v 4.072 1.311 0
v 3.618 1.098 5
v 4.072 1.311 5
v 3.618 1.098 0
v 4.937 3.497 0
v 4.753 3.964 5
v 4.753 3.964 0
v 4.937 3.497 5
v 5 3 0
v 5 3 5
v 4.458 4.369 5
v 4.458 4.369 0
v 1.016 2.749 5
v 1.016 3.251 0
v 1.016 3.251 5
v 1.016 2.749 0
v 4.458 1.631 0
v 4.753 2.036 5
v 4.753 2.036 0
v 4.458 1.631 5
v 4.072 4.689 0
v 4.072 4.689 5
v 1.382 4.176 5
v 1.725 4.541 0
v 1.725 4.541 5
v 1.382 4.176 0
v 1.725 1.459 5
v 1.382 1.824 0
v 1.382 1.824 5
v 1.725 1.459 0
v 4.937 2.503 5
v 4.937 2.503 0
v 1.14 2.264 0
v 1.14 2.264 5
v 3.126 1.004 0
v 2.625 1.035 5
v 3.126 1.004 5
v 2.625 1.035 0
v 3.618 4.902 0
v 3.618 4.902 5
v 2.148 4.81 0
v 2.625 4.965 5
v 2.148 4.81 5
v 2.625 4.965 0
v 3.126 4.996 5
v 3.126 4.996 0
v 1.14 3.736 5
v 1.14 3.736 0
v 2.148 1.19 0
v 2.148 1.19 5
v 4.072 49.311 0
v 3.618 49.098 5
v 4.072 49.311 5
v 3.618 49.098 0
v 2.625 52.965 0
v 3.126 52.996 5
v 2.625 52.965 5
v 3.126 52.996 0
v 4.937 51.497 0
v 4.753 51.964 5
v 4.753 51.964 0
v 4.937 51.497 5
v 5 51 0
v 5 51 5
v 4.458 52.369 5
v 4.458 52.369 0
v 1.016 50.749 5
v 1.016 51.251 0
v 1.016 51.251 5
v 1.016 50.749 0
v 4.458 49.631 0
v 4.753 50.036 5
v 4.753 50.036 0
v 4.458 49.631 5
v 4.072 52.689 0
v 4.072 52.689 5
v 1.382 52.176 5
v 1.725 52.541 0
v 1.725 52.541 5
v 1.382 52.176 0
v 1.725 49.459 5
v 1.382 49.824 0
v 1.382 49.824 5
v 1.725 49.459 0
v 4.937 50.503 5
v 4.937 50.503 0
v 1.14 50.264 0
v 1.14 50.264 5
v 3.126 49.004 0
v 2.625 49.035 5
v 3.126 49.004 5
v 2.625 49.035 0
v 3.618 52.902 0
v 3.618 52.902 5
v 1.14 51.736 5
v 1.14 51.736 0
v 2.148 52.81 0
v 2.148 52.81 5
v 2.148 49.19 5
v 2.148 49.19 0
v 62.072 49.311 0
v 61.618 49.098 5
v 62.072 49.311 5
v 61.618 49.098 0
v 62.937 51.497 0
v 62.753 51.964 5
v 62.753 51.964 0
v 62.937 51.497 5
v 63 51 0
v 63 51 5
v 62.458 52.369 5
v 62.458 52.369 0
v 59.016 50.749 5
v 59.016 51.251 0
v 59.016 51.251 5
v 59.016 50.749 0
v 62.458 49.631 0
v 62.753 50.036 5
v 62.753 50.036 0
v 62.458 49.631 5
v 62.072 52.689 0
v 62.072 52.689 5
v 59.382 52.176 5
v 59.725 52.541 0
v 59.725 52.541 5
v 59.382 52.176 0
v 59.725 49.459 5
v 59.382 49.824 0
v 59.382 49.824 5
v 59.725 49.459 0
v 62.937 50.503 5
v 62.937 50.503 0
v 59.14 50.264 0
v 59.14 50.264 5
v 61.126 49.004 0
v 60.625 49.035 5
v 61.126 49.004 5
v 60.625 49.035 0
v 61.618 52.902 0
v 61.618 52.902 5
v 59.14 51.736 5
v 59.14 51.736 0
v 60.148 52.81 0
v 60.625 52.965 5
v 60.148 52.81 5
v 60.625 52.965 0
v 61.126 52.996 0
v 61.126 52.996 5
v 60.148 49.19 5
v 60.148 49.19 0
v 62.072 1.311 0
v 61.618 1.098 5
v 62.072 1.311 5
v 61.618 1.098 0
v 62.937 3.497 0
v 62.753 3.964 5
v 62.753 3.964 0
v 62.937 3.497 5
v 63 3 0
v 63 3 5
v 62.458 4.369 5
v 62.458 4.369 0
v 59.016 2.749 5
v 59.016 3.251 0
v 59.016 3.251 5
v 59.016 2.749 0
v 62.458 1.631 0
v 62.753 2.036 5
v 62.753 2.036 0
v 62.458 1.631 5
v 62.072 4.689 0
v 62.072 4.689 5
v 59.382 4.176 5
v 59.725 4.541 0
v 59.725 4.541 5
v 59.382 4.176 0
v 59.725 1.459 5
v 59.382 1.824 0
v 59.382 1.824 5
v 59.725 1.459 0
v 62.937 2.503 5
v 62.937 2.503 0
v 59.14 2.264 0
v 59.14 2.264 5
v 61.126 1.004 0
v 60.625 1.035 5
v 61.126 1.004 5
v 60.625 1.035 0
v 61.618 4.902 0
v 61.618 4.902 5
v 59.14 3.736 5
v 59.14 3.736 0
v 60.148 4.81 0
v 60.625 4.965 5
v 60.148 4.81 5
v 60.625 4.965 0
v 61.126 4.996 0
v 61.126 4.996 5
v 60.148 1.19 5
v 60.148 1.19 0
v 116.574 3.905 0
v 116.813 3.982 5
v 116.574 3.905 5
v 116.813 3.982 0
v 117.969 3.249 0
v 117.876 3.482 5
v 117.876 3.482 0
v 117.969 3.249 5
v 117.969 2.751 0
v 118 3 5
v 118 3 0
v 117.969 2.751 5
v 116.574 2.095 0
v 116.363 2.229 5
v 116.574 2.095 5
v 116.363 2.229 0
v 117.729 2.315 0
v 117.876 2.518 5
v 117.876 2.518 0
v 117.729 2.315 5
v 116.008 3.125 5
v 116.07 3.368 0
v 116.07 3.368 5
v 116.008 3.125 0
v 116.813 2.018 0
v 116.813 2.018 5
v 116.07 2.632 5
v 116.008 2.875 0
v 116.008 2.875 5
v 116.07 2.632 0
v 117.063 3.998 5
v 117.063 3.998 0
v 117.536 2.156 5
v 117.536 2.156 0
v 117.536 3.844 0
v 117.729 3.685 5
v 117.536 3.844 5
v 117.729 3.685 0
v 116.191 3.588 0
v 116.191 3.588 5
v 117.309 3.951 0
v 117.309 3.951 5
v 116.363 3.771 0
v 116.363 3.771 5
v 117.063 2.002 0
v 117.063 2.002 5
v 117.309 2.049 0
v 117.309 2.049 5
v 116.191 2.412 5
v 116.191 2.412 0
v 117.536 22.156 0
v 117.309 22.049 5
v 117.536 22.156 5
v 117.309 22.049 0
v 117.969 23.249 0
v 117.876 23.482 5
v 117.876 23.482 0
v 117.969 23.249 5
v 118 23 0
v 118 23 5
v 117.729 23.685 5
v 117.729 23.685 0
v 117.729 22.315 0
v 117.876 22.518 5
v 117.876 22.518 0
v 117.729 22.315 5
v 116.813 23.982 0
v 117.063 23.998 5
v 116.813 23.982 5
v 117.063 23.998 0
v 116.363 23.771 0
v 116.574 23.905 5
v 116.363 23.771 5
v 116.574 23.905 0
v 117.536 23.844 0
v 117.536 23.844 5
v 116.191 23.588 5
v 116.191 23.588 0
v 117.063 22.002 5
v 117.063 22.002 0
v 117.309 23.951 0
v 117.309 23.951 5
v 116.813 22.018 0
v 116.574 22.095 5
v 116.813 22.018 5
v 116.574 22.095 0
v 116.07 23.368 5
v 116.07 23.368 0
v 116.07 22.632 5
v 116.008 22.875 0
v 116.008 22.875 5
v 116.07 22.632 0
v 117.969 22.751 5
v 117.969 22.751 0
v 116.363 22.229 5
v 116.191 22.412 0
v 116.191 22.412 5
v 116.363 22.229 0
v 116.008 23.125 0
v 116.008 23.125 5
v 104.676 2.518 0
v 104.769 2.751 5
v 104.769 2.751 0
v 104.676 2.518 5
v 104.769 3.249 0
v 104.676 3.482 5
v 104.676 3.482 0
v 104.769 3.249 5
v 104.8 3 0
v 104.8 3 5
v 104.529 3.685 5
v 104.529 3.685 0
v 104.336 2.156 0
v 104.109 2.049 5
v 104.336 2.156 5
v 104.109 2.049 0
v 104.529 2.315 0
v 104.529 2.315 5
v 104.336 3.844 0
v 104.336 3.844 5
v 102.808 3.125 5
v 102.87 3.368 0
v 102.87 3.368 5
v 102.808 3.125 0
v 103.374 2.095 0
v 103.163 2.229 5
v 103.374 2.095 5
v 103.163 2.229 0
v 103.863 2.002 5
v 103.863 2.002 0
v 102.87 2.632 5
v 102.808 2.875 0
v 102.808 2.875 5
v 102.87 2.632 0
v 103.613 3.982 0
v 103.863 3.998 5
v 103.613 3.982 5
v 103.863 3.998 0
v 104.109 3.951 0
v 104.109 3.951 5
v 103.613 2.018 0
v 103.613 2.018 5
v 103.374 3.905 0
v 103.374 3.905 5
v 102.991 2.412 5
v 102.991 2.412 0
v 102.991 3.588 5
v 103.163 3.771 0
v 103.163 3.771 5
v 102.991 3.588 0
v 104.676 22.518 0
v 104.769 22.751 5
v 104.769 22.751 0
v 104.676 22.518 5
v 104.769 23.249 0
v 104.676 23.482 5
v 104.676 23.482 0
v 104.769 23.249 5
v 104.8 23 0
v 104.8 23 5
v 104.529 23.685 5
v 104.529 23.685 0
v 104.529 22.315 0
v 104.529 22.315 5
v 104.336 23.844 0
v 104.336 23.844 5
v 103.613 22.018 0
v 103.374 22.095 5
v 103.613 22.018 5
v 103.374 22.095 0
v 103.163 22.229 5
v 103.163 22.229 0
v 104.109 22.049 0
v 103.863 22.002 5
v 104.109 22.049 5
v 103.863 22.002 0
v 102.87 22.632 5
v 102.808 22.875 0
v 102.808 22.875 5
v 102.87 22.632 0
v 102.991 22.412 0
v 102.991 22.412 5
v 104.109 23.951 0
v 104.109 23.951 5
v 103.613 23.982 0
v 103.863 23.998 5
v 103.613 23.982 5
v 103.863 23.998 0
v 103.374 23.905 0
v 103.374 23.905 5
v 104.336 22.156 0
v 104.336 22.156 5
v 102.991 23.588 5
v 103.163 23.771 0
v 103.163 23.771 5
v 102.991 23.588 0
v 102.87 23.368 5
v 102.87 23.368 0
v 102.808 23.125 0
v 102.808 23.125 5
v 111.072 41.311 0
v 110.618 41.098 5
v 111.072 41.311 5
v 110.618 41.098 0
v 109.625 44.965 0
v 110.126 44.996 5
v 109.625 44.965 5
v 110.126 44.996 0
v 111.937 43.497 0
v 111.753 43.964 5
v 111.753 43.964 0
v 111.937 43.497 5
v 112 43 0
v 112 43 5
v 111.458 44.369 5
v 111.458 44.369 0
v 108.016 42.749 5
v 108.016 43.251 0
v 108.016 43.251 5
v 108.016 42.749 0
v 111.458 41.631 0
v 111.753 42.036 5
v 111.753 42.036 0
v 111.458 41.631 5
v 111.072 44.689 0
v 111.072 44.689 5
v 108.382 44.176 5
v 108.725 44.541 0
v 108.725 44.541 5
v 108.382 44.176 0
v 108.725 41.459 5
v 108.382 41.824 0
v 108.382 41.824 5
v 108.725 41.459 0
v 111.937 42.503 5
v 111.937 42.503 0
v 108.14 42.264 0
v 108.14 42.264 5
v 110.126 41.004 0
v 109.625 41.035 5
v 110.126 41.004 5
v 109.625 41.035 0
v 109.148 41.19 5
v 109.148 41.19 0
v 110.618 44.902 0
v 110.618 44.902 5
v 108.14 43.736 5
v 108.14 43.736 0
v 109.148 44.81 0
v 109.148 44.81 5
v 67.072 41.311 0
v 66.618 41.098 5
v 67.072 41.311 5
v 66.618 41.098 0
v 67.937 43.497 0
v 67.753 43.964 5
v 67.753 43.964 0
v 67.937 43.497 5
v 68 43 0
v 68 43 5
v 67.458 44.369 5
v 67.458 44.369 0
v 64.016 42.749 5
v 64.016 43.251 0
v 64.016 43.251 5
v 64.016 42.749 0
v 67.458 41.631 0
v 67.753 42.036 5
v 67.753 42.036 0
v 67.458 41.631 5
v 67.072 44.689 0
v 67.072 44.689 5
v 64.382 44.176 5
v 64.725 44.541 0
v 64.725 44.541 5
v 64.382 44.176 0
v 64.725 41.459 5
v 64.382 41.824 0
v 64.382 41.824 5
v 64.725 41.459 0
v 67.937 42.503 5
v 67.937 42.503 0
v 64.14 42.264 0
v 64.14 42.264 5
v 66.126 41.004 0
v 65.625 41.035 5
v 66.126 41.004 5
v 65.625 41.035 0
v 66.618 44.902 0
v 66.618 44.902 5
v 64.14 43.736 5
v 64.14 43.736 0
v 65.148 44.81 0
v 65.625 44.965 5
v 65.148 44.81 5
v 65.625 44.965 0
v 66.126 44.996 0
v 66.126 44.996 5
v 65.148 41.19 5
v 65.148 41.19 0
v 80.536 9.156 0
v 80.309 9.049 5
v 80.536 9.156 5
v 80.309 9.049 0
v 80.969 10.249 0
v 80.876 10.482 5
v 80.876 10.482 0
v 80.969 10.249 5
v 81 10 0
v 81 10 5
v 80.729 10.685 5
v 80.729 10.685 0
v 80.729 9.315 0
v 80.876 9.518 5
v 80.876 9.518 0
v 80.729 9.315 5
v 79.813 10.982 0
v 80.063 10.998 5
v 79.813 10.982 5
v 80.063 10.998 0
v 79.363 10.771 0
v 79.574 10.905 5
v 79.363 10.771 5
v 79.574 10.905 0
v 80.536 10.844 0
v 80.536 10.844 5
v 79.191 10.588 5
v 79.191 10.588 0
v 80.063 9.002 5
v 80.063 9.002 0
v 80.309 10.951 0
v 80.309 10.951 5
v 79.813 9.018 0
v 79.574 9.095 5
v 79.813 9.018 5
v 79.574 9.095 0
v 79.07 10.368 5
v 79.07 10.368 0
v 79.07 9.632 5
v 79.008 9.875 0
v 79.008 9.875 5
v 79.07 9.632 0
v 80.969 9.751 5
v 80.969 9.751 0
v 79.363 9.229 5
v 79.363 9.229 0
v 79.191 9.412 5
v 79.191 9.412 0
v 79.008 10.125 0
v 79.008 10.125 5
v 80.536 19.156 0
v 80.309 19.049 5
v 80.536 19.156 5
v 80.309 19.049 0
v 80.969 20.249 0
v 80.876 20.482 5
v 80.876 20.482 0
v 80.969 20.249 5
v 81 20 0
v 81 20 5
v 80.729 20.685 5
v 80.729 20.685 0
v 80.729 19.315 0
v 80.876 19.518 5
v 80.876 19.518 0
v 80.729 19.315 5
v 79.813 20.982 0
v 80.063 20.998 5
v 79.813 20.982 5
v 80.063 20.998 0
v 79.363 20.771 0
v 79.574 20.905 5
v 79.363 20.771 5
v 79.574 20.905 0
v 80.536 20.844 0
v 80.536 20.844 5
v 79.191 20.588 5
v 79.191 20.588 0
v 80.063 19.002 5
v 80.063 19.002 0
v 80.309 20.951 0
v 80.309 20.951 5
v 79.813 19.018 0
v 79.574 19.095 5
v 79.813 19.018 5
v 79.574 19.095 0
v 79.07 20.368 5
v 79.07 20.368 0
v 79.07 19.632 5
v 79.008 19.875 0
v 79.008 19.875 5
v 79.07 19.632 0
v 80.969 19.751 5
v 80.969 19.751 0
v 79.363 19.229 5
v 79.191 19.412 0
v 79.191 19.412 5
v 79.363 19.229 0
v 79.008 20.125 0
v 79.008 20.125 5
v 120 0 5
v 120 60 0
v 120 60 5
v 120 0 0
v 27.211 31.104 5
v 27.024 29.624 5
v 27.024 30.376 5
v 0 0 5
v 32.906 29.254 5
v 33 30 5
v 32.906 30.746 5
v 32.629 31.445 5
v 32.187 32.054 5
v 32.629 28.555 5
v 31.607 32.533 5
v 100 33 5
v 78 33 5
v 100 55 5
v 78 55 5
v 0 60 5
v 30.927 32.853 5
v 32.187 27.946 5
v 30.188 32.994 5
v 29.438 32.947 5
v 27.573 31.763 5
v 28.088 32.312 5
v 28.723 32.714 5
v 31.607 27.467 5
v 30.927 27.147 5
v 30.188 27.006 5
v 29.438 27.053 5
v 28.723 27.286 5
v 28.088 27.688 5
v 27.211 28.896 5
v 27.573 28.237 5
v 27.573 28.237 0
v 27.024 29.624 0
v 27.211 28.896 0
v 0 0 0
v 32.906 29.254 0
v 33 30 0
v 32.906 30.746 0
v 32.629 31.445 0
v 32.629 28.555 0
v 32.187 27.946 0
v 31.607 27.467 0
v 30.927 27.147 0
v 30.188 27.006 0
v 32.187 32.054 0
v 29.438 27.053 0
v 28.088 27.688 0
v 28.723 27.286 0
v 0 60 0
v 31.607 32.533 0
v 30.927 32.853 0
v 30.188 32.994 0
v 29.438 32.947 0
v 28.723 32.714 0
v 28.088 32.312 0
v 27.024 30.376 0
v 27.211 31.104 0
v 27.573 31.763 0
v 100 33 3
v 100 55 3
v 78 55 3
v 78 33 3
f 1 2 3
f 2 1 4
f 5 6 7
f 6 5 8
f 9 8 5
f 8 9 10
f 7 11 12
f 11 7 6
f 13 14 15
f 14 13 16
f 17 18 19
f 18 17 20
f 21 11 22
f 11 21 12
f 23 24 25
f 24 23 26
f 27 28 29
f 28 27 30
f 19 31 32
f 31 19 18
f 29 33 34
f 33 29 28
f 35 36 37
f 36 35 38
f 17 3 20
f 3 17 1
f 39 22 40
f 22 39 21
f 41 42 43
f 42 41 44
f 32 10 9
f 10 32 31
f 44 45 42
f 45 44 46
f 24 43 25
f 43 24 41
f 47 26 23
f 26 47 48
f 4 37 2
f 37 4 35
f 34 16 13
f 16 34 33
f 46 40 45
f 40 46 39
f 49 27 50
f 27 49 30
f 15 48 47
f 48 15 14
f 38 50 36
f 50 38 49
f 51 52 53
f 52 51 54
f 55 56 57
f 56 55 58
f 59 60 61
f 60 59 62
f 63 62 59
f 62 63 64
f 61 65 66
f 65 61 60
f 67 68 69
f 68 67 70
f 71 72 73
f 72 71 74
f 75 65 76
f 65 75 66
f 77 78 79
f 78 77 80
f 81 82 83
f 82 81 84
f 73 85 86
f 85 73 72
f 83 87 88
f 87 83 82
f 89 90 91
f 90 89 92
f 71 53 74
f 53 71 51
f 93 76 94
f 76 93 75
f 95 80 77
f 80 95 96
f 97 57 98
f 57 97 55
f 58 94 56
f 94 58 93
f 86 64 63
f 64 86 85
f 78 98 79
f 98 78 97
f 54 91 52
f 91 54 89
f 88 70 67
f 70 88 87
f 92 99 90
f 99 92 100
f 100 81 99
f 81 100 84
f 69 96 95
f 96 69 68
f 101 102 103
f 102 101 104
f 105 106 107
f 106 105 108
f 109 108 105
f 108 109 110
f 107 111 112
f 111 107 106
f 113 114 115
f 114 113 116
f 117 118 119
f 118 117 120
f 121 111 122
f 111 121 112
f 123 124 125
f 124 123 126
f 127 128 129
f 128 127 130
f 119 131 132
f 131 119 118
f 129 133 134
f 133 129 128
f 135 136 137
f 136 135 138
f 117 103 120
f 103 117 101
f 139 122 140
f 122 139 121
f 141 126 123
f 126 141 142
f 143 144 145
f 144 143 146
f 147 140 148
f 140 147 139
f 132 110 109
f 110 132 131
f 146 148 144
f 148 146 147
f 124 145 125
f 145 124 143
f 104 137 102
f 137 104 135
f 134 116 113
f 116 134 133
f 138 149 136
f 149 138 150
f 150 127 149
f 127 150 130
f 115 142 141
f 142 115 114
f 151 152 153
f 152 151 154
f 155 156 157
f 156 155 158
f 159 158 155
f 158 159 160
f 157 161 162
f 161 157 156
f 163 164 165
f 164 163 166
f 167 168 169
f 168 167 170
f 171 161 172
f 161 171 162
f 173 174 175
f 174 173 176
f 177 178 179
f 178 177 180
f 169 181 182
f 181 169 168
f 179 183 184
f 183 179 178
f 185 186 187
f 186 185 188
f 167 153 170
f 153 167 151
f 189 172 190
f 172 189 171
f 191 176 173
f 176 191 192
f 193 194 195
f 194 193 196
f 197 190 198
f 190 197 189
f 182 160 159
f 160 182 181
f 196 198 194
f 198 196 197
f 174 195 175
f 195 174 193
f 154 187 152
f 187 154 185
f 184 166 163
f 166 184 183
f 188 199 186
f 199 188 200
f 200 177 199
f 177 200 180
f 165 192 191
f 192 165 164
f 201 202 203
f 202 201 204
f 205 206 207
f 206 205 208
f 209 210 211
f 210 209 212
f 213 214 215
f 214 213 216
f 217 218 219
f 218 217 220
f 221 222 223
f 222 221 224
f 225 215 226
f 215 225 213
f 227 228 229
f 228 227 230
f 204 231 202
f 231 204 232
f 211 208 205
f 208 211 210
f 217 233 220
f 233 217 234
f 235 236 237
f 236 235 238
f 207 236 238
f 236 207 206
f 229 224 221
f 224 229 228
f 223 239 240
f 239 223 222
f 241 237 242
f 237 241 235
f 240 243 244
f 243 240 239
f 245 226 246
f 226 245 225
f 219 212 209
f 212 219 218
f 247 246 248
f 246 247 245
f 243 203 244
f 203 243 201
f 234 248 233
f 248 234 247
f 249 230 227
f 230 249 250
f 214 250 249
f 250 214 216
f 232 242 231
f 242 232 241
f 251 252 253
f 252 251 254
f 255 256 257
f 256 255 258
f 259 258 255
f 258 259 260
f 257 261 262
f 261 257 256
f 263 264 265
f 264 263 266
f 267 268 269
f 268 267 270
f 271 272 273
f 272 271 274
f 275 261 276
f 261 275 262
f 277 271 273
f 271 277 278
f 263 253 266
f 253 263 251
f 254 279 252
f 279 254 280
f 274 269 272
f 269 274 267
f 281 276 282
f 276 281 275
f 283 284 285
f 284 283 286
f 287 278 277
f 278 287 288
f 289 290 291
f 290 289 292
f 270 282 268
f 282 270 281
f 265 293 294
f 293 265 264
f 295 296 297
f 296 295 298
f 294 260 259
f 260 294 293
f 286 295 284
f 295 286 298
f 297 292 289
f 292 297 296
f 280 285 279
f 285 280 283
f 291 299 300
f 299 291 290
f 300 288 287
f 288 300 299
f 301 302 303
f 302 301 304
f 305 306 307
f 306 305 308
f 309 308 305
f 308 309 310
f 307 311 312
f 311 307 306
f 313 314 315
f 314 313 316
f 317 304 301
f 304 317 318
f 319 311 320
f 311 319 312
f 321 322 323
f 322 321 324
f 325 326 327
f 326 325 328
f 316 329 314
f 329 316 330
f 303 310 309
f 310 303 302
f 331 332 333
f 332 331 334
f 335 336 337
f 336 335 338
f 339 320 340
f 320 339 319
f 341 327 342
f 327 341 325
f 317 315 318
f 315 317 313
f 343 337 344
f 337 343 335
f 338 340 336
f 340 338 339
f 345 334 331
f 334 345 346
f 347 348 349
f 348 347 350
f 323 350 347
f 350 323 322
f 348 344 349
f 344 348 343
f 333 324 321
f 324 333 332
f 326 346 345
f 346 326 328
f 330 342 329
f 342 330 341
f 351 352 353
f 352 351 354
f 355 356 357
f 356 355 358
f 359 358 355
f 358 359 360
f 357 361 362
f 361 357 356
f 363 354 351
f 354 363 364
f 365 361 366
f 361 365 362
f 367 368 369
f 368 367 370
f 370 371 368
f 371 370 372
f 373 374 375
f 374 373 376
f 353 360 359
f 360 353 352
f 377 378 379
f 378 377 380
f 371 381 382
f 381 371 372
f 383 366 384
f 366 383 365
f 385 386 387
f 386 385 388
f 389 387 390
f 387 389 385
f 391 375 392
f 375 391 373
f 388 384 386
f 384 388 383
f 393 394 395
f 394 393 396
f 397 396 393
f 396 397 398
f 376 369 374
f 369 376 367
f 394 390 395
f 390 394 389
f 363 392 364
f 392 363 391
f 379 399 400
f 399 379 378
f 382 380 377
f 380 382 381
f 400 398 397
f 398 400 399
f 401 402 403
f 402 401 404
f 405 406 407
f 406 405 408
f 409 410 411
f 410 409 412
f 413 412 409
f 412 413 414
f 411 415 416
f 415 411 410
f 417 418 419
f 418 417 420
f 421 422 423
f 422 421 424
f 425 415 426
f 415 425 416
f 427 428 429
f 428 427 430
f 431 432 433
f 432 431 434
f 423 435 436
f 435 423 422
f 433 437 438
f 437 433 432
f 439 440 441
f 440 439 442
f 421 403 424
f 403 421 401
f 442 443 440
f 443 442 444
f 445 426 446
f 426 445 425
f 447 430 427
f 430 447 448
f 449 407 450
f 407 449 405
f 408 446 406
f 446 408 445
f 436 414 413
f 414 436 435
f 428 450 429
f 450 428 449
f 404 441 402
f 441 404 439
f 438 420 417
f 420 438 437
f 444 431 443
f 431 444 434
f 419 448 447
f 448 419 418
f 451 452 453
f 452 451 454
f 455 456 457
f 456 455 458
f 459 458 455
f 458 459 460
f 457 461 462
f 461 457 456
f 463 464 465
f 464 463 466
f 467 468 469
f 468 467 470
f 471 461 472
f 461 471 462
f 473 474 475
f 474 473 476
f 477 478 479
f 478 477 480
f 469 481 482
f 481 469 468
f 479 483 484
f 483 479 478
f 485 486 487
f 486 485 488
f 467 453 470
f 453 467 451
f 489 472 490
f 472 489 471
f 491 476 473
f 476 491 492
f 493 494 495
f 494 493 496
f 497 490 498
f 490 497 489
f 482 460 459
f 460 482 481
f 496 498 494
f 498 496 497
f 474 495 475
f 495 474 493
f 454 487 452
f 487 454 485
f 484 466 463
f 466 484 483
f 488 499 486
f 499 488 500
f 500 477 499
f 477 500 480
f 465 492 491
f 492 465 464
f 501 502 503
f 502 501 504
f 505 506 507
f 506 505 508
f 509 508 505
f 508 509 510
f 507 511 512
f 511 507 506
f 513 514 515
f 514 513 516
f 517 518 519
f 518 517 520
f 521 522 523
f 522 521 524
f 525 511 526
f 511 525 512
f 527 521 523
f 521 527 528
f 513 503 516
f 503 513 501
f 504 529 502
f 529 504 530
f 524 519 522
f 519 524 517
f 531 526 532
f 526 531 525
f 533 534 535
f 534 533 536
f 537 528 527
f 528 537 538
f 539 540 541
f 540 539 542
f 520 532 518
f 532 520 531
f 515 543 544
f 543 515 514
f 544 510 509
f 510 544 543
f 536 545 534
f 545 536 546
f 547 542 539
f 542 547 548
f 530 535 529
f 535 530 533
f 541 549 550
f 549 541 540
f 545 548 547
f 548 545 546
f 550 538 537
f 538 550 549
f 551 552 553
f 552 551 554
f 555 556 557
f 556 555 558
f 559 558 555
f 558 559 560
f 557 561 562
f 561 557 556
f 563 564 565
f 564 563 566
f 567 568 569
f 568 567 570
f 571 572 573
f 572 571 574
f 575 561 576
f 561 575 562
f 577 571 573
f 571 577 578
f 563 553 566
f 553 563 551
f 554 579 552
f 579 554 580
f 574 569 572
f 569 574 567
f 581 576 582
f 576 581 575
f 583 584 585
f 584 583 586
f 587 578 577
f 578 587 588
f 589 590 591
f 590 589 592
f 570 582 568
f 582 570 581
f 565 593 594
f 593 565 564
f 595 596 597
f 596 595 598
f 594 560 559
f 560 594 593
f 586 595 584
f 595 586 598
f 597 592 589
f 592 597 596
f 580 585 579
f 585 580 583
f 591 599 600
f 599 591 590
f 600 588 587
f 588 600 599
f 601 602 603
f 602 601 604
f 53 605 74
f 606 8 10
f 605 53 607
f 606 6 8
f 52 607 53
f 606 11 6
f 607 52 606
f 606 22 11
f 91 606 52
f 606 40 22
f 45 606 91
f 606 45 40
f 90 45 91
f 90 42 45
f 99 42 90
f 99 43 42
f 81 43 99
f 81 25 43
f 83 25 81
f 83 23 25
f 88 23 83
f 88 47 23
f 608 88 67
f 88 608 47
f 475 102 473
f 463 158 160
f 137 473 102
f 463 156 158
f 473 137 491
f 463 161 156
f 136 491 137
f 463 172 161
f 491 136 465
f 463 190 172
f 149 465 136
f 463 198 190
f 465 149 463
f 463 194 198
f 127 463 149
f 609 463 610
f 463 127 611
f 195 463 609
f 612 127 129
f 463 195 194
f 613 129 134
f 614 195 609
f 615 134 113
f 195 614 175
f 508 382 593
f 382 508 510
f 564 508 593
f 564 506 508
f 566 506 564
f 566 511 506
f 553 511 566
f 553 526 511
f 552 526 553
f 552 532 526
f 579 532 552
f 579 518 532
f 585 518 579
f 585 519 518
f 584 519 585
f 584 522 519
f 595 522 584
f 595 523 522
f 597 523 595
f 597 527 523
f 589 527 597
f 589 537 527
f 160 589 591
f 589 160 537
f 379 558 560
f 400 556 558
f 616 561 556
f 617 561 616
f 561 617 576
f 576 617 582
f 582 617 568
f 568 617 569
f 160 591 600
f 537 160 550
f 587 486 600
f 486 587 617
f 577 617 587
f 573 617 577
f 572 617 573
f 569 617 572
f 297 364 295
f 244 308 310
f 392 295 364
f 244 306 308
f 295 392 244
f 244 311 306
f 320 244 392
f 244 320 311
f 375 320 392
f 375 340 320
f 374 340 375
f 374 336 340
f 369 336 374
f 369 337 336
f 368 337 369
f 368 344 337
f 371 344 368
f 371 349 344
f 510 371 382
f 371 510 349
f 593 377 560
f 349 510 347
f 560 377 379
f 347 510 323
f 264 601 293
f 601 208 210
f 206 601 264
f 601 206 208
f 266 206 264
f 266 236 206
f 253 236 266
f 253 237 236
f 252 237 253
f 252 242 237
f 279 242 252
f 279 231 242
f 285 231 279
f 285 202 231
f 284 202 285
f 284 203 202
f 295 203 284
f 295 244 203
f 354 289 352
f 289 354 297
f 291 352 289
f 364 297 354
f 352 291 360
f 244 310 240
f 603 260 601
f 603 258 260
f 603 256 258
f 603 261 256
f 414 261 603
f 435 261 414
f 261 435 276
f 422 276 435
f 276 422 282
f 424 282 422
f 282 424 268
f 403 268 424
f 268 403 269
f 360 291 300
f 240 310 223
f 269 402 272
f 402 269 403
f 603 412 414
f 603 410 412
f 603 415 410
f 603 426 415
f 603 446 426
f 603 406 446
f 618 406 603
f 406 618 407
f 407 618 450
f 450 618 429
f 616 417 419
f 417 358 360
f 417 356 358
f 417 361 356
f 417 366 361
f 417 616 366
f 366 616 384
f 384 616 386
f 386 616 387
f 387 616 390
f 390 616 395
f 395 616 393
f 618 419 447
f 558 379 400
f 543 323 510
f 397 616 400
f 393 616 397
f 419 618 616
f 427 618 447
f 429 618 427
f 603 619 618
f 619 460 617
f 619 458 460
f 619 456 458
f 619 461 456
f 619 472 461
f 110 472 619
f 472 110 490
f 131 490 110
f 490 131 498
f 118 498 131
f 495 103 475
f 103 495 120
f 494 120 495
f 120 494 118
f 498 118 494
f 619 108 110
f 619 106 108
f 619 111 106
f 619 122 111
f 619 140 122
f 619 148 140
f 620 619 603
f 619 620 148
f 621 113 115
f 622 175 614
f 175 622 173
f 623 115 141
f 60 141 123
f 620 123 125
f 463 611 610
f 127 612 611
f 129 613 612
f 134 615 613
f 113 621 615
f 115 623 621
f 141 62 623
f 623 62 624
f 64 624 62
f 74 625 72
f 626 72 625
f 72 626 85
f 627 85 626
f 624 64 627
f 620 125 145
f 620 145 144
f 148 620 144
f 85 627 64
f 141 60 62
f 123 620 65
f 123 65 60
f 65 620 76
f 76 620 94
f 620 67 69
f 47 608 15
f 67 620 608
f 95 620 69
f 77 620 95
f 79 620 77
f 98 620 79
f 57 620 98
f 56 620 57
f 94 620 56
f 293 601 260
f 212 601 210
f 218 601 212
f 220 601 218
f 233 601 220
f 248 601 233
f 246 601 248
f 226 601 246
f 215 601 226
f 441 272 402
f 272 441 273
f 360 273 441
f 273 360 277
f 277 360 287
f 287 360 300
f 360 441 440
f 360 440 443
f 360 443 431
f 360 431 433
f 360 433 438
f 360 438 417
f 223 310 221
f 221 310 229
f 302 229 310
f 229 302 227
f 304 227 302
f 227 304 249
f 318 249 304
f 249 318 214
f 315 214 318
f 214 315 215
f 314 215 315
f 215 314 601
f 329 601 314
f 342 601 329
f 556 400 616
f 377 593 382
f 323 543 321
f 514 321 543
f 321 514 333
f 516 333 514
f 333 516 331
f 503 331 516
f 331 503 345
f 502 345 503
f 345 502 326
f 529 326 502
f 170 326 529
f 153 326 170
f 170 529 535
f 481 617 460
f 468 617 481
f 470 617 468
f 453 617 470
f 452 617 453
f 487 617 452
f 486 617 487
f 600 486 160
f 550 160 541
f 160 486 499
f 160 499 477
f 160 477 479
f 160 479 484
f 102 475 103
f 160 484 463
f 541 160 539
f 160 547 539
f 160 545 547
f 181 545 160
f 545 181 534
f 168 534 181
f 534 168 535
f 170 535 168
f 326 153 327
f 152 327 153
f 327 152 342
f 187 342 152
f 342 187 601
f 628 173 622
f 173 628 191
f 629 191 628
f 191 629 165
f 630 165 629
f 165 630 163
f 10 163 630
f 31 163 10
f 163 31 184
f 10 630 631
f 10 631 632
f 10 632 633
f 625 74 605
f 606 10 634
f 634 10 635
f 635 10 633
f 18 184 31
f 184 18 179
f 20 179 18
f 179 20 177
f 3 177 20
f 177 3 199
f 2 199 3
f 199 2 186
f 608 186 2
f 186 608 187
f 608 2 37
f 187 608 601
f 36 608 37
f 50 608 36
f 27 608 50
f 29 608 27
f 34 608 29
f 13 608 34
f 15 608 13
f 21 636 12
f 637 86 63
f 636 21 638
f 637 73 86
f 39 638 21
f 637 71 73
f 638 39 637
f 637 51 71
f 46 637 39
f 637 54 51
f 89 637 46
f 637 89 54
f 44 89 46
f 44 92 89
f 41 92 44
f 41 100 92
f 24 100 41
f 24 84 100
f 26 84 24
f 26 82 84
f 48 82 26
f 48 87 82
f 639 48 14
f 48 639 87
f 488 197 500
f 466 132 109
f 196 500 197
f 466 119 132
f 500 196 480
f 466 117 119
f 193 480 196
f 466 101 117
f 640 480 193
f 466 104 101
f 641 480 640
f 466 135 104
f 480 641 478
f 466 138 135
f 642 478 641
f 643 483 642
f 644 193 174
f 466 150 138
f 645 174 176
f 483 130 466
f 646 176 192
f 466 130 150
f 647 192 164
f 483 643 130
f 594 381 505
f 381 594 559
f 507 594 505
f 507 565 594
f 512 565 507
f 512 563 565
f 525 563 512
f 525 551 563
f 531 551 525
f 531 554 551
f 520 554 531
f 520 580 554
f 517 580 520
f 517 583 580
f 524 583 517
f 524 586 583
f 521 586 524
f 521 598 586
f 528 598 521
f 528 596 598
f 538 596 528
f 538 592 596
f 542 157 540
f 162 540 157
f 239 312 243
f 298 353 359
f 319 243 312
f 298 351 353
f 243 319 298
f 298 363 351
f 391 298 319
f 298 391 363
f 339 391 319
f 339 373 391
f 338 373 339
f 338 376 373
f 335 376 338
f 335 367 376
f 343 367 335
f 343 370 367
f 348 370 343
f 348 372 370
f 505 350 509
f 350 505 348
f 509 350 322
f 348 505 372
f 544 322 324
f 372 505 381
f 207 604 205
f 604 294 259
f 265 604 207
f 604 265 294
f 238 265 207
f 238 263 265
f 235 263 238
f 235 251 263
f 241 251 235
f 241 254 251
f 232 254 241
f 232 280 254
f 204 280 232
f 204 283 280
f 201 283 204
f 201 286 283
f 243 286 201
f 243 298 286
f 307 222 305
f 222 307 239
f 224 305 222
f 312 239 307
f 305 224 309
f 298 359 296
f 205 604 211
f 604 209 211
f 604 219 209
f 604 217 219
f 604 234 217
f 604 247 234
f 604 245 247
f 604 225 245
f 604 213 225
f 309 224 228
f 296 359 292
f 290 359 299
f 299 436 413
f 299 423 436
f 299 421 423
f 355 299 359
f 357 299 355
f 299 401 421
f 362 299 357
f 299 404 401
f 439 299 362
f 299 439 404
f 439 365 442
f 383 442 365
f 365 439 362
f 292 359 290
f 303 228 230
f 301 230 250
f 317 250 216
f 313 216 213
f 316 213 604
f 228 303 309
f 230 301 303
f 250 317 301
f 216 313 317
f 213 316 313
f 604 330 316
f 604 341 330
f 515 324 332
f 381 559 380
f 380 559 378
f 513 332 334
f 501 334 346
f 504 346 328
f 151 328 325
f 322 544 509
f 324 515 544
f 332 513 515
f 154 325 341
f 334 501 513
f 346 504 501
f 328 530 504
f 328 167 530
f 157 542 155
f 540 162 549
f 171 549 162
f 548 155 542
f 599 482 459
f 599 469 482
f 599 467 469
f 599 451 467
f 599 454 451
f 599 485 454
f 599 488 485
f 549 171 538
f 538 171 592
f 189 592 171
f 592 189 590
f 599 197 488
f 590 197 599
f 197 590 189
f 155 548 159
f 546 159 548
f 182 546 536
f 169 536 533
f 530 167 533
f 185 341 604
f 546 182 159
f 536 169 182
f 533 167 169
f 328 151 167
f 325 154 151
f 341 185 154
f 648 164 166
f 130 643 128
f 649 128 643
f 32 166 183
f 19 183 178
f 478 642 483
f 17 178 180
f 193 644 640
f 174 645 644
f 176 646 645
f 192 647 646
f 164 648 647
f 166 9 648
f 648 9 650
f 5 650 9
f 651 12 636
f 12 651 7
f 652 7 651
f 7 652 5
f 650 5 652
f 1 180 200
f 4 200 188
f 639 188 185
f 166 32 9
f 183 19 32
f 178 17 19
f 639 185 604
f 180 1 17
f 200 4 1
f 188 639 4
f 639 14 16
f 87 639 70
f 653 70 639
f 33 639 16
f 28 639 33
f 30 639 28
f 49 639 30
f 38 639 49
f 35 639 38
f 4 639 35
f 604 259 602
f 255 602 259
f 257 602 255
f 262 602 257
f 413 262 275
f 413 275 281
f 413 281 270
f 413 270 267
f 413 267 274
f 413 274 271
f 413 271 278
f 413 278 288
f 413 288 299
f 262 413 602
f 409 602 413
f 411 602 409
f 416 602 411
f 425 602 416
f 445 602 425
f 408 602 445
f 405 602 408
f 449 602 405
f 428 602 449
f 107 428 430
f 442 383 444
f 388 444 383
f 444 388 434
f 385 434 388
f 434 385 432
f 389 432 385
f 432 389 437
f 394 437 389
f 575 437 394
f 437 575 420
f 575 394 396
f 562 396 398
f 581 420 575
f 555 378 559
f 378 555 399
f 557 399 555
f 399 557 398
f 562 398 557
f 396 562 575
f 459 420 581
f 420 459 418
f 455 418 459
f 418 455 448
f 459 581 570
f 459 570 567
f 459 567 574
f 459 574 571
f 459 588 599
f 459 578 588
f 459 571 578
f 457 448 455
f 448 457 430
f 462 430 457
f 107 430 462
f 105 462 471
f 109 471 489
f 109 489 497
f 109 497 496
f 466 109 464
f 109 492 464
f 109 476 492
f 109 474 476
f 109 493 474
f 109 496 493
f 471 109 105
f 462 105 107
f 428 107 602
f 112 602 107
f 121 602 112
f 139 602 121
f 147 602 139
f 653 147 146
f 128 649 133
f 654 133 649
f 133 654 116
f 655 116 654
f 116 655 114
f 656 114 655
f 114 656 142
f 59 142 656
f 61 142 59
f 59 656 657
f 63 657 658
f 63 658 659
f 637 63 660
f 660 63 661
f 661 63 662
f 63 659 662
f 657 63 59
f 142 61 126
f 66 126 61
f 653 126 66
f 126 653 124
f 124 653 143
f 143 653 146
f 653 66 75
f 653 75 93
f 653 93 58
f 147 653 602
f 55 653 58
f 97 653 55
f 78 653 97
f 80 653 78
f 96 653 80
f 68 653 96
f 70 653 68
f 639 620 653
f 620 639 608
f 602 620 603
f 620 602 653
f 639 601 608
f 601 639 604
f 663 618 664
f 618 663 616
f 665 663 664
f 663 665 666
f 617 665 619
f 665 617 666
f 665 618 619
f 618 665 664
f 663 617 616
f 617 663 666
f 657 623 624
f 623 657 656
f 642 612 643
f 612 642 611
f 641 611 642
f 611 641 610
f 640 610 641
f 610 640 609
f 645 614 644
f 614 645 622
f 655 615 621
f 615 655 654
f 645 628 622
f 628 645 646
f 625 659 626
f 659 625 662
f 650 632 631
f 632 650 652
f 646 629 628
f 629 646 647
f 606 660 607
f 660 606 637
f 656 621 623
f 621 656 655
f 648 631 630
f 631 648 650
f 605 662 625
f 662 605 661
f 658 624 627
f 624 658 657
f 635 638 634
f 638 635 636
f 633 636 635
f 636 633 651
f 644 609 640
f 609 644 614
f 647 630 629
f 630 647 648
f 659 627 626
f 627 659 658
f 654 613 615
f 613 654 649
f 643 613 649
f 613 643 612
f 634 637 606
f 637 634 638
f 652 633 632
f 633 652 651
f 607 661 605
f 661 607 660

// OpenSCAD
$fn=25;
difference(){
	color([0,0,0]){
	cube([120,60,5]);
	}
	// pi top
	color([0,1,0]){
	translate([3,3,-1])cylinder(h=10,r=2);
	translate([3,51,-1])cylinder(h=10,r=2);
	translate([61,51,-1])cylinder(h=10,r=2);
	translate([61,3,-1])cylinder(h=10,r=2);
	}
	// pi cam top
	color([1,0,0]){
	translate([117,3,-1])cylinder(h=10,r=1);
	translate([117,23,-1])cylinder(h=10,r=1);
	translate([117-13.2,3,-1])cylinder(h=10,r=1);
	translate([117-13.2,23,-1])cylinder(h=10,r=1);
	}
	// arduino bottom
	color([0,0,1]){
	translate([110,60-17,-1])cylinder(h=10,r=2);
	translate([110-44,60-17,-1])cylinder(h=10,r=2);
	}
	// GPS top
	color([0,1,1]){
	translate([110-32,60-27,3])cube([22,22,6]);
	}
	// methane bottom
	color([1,1,0]){
	translate([30,30,-1])cylinder(h=10,r=3);
	}
	// BME280 bottom
	color([1,0,1]){
	translate([80,10,-1])cylinder(h=10,r=1);
	translate([80,20,-1])cylinder(h=10,r=1);
	}
}
